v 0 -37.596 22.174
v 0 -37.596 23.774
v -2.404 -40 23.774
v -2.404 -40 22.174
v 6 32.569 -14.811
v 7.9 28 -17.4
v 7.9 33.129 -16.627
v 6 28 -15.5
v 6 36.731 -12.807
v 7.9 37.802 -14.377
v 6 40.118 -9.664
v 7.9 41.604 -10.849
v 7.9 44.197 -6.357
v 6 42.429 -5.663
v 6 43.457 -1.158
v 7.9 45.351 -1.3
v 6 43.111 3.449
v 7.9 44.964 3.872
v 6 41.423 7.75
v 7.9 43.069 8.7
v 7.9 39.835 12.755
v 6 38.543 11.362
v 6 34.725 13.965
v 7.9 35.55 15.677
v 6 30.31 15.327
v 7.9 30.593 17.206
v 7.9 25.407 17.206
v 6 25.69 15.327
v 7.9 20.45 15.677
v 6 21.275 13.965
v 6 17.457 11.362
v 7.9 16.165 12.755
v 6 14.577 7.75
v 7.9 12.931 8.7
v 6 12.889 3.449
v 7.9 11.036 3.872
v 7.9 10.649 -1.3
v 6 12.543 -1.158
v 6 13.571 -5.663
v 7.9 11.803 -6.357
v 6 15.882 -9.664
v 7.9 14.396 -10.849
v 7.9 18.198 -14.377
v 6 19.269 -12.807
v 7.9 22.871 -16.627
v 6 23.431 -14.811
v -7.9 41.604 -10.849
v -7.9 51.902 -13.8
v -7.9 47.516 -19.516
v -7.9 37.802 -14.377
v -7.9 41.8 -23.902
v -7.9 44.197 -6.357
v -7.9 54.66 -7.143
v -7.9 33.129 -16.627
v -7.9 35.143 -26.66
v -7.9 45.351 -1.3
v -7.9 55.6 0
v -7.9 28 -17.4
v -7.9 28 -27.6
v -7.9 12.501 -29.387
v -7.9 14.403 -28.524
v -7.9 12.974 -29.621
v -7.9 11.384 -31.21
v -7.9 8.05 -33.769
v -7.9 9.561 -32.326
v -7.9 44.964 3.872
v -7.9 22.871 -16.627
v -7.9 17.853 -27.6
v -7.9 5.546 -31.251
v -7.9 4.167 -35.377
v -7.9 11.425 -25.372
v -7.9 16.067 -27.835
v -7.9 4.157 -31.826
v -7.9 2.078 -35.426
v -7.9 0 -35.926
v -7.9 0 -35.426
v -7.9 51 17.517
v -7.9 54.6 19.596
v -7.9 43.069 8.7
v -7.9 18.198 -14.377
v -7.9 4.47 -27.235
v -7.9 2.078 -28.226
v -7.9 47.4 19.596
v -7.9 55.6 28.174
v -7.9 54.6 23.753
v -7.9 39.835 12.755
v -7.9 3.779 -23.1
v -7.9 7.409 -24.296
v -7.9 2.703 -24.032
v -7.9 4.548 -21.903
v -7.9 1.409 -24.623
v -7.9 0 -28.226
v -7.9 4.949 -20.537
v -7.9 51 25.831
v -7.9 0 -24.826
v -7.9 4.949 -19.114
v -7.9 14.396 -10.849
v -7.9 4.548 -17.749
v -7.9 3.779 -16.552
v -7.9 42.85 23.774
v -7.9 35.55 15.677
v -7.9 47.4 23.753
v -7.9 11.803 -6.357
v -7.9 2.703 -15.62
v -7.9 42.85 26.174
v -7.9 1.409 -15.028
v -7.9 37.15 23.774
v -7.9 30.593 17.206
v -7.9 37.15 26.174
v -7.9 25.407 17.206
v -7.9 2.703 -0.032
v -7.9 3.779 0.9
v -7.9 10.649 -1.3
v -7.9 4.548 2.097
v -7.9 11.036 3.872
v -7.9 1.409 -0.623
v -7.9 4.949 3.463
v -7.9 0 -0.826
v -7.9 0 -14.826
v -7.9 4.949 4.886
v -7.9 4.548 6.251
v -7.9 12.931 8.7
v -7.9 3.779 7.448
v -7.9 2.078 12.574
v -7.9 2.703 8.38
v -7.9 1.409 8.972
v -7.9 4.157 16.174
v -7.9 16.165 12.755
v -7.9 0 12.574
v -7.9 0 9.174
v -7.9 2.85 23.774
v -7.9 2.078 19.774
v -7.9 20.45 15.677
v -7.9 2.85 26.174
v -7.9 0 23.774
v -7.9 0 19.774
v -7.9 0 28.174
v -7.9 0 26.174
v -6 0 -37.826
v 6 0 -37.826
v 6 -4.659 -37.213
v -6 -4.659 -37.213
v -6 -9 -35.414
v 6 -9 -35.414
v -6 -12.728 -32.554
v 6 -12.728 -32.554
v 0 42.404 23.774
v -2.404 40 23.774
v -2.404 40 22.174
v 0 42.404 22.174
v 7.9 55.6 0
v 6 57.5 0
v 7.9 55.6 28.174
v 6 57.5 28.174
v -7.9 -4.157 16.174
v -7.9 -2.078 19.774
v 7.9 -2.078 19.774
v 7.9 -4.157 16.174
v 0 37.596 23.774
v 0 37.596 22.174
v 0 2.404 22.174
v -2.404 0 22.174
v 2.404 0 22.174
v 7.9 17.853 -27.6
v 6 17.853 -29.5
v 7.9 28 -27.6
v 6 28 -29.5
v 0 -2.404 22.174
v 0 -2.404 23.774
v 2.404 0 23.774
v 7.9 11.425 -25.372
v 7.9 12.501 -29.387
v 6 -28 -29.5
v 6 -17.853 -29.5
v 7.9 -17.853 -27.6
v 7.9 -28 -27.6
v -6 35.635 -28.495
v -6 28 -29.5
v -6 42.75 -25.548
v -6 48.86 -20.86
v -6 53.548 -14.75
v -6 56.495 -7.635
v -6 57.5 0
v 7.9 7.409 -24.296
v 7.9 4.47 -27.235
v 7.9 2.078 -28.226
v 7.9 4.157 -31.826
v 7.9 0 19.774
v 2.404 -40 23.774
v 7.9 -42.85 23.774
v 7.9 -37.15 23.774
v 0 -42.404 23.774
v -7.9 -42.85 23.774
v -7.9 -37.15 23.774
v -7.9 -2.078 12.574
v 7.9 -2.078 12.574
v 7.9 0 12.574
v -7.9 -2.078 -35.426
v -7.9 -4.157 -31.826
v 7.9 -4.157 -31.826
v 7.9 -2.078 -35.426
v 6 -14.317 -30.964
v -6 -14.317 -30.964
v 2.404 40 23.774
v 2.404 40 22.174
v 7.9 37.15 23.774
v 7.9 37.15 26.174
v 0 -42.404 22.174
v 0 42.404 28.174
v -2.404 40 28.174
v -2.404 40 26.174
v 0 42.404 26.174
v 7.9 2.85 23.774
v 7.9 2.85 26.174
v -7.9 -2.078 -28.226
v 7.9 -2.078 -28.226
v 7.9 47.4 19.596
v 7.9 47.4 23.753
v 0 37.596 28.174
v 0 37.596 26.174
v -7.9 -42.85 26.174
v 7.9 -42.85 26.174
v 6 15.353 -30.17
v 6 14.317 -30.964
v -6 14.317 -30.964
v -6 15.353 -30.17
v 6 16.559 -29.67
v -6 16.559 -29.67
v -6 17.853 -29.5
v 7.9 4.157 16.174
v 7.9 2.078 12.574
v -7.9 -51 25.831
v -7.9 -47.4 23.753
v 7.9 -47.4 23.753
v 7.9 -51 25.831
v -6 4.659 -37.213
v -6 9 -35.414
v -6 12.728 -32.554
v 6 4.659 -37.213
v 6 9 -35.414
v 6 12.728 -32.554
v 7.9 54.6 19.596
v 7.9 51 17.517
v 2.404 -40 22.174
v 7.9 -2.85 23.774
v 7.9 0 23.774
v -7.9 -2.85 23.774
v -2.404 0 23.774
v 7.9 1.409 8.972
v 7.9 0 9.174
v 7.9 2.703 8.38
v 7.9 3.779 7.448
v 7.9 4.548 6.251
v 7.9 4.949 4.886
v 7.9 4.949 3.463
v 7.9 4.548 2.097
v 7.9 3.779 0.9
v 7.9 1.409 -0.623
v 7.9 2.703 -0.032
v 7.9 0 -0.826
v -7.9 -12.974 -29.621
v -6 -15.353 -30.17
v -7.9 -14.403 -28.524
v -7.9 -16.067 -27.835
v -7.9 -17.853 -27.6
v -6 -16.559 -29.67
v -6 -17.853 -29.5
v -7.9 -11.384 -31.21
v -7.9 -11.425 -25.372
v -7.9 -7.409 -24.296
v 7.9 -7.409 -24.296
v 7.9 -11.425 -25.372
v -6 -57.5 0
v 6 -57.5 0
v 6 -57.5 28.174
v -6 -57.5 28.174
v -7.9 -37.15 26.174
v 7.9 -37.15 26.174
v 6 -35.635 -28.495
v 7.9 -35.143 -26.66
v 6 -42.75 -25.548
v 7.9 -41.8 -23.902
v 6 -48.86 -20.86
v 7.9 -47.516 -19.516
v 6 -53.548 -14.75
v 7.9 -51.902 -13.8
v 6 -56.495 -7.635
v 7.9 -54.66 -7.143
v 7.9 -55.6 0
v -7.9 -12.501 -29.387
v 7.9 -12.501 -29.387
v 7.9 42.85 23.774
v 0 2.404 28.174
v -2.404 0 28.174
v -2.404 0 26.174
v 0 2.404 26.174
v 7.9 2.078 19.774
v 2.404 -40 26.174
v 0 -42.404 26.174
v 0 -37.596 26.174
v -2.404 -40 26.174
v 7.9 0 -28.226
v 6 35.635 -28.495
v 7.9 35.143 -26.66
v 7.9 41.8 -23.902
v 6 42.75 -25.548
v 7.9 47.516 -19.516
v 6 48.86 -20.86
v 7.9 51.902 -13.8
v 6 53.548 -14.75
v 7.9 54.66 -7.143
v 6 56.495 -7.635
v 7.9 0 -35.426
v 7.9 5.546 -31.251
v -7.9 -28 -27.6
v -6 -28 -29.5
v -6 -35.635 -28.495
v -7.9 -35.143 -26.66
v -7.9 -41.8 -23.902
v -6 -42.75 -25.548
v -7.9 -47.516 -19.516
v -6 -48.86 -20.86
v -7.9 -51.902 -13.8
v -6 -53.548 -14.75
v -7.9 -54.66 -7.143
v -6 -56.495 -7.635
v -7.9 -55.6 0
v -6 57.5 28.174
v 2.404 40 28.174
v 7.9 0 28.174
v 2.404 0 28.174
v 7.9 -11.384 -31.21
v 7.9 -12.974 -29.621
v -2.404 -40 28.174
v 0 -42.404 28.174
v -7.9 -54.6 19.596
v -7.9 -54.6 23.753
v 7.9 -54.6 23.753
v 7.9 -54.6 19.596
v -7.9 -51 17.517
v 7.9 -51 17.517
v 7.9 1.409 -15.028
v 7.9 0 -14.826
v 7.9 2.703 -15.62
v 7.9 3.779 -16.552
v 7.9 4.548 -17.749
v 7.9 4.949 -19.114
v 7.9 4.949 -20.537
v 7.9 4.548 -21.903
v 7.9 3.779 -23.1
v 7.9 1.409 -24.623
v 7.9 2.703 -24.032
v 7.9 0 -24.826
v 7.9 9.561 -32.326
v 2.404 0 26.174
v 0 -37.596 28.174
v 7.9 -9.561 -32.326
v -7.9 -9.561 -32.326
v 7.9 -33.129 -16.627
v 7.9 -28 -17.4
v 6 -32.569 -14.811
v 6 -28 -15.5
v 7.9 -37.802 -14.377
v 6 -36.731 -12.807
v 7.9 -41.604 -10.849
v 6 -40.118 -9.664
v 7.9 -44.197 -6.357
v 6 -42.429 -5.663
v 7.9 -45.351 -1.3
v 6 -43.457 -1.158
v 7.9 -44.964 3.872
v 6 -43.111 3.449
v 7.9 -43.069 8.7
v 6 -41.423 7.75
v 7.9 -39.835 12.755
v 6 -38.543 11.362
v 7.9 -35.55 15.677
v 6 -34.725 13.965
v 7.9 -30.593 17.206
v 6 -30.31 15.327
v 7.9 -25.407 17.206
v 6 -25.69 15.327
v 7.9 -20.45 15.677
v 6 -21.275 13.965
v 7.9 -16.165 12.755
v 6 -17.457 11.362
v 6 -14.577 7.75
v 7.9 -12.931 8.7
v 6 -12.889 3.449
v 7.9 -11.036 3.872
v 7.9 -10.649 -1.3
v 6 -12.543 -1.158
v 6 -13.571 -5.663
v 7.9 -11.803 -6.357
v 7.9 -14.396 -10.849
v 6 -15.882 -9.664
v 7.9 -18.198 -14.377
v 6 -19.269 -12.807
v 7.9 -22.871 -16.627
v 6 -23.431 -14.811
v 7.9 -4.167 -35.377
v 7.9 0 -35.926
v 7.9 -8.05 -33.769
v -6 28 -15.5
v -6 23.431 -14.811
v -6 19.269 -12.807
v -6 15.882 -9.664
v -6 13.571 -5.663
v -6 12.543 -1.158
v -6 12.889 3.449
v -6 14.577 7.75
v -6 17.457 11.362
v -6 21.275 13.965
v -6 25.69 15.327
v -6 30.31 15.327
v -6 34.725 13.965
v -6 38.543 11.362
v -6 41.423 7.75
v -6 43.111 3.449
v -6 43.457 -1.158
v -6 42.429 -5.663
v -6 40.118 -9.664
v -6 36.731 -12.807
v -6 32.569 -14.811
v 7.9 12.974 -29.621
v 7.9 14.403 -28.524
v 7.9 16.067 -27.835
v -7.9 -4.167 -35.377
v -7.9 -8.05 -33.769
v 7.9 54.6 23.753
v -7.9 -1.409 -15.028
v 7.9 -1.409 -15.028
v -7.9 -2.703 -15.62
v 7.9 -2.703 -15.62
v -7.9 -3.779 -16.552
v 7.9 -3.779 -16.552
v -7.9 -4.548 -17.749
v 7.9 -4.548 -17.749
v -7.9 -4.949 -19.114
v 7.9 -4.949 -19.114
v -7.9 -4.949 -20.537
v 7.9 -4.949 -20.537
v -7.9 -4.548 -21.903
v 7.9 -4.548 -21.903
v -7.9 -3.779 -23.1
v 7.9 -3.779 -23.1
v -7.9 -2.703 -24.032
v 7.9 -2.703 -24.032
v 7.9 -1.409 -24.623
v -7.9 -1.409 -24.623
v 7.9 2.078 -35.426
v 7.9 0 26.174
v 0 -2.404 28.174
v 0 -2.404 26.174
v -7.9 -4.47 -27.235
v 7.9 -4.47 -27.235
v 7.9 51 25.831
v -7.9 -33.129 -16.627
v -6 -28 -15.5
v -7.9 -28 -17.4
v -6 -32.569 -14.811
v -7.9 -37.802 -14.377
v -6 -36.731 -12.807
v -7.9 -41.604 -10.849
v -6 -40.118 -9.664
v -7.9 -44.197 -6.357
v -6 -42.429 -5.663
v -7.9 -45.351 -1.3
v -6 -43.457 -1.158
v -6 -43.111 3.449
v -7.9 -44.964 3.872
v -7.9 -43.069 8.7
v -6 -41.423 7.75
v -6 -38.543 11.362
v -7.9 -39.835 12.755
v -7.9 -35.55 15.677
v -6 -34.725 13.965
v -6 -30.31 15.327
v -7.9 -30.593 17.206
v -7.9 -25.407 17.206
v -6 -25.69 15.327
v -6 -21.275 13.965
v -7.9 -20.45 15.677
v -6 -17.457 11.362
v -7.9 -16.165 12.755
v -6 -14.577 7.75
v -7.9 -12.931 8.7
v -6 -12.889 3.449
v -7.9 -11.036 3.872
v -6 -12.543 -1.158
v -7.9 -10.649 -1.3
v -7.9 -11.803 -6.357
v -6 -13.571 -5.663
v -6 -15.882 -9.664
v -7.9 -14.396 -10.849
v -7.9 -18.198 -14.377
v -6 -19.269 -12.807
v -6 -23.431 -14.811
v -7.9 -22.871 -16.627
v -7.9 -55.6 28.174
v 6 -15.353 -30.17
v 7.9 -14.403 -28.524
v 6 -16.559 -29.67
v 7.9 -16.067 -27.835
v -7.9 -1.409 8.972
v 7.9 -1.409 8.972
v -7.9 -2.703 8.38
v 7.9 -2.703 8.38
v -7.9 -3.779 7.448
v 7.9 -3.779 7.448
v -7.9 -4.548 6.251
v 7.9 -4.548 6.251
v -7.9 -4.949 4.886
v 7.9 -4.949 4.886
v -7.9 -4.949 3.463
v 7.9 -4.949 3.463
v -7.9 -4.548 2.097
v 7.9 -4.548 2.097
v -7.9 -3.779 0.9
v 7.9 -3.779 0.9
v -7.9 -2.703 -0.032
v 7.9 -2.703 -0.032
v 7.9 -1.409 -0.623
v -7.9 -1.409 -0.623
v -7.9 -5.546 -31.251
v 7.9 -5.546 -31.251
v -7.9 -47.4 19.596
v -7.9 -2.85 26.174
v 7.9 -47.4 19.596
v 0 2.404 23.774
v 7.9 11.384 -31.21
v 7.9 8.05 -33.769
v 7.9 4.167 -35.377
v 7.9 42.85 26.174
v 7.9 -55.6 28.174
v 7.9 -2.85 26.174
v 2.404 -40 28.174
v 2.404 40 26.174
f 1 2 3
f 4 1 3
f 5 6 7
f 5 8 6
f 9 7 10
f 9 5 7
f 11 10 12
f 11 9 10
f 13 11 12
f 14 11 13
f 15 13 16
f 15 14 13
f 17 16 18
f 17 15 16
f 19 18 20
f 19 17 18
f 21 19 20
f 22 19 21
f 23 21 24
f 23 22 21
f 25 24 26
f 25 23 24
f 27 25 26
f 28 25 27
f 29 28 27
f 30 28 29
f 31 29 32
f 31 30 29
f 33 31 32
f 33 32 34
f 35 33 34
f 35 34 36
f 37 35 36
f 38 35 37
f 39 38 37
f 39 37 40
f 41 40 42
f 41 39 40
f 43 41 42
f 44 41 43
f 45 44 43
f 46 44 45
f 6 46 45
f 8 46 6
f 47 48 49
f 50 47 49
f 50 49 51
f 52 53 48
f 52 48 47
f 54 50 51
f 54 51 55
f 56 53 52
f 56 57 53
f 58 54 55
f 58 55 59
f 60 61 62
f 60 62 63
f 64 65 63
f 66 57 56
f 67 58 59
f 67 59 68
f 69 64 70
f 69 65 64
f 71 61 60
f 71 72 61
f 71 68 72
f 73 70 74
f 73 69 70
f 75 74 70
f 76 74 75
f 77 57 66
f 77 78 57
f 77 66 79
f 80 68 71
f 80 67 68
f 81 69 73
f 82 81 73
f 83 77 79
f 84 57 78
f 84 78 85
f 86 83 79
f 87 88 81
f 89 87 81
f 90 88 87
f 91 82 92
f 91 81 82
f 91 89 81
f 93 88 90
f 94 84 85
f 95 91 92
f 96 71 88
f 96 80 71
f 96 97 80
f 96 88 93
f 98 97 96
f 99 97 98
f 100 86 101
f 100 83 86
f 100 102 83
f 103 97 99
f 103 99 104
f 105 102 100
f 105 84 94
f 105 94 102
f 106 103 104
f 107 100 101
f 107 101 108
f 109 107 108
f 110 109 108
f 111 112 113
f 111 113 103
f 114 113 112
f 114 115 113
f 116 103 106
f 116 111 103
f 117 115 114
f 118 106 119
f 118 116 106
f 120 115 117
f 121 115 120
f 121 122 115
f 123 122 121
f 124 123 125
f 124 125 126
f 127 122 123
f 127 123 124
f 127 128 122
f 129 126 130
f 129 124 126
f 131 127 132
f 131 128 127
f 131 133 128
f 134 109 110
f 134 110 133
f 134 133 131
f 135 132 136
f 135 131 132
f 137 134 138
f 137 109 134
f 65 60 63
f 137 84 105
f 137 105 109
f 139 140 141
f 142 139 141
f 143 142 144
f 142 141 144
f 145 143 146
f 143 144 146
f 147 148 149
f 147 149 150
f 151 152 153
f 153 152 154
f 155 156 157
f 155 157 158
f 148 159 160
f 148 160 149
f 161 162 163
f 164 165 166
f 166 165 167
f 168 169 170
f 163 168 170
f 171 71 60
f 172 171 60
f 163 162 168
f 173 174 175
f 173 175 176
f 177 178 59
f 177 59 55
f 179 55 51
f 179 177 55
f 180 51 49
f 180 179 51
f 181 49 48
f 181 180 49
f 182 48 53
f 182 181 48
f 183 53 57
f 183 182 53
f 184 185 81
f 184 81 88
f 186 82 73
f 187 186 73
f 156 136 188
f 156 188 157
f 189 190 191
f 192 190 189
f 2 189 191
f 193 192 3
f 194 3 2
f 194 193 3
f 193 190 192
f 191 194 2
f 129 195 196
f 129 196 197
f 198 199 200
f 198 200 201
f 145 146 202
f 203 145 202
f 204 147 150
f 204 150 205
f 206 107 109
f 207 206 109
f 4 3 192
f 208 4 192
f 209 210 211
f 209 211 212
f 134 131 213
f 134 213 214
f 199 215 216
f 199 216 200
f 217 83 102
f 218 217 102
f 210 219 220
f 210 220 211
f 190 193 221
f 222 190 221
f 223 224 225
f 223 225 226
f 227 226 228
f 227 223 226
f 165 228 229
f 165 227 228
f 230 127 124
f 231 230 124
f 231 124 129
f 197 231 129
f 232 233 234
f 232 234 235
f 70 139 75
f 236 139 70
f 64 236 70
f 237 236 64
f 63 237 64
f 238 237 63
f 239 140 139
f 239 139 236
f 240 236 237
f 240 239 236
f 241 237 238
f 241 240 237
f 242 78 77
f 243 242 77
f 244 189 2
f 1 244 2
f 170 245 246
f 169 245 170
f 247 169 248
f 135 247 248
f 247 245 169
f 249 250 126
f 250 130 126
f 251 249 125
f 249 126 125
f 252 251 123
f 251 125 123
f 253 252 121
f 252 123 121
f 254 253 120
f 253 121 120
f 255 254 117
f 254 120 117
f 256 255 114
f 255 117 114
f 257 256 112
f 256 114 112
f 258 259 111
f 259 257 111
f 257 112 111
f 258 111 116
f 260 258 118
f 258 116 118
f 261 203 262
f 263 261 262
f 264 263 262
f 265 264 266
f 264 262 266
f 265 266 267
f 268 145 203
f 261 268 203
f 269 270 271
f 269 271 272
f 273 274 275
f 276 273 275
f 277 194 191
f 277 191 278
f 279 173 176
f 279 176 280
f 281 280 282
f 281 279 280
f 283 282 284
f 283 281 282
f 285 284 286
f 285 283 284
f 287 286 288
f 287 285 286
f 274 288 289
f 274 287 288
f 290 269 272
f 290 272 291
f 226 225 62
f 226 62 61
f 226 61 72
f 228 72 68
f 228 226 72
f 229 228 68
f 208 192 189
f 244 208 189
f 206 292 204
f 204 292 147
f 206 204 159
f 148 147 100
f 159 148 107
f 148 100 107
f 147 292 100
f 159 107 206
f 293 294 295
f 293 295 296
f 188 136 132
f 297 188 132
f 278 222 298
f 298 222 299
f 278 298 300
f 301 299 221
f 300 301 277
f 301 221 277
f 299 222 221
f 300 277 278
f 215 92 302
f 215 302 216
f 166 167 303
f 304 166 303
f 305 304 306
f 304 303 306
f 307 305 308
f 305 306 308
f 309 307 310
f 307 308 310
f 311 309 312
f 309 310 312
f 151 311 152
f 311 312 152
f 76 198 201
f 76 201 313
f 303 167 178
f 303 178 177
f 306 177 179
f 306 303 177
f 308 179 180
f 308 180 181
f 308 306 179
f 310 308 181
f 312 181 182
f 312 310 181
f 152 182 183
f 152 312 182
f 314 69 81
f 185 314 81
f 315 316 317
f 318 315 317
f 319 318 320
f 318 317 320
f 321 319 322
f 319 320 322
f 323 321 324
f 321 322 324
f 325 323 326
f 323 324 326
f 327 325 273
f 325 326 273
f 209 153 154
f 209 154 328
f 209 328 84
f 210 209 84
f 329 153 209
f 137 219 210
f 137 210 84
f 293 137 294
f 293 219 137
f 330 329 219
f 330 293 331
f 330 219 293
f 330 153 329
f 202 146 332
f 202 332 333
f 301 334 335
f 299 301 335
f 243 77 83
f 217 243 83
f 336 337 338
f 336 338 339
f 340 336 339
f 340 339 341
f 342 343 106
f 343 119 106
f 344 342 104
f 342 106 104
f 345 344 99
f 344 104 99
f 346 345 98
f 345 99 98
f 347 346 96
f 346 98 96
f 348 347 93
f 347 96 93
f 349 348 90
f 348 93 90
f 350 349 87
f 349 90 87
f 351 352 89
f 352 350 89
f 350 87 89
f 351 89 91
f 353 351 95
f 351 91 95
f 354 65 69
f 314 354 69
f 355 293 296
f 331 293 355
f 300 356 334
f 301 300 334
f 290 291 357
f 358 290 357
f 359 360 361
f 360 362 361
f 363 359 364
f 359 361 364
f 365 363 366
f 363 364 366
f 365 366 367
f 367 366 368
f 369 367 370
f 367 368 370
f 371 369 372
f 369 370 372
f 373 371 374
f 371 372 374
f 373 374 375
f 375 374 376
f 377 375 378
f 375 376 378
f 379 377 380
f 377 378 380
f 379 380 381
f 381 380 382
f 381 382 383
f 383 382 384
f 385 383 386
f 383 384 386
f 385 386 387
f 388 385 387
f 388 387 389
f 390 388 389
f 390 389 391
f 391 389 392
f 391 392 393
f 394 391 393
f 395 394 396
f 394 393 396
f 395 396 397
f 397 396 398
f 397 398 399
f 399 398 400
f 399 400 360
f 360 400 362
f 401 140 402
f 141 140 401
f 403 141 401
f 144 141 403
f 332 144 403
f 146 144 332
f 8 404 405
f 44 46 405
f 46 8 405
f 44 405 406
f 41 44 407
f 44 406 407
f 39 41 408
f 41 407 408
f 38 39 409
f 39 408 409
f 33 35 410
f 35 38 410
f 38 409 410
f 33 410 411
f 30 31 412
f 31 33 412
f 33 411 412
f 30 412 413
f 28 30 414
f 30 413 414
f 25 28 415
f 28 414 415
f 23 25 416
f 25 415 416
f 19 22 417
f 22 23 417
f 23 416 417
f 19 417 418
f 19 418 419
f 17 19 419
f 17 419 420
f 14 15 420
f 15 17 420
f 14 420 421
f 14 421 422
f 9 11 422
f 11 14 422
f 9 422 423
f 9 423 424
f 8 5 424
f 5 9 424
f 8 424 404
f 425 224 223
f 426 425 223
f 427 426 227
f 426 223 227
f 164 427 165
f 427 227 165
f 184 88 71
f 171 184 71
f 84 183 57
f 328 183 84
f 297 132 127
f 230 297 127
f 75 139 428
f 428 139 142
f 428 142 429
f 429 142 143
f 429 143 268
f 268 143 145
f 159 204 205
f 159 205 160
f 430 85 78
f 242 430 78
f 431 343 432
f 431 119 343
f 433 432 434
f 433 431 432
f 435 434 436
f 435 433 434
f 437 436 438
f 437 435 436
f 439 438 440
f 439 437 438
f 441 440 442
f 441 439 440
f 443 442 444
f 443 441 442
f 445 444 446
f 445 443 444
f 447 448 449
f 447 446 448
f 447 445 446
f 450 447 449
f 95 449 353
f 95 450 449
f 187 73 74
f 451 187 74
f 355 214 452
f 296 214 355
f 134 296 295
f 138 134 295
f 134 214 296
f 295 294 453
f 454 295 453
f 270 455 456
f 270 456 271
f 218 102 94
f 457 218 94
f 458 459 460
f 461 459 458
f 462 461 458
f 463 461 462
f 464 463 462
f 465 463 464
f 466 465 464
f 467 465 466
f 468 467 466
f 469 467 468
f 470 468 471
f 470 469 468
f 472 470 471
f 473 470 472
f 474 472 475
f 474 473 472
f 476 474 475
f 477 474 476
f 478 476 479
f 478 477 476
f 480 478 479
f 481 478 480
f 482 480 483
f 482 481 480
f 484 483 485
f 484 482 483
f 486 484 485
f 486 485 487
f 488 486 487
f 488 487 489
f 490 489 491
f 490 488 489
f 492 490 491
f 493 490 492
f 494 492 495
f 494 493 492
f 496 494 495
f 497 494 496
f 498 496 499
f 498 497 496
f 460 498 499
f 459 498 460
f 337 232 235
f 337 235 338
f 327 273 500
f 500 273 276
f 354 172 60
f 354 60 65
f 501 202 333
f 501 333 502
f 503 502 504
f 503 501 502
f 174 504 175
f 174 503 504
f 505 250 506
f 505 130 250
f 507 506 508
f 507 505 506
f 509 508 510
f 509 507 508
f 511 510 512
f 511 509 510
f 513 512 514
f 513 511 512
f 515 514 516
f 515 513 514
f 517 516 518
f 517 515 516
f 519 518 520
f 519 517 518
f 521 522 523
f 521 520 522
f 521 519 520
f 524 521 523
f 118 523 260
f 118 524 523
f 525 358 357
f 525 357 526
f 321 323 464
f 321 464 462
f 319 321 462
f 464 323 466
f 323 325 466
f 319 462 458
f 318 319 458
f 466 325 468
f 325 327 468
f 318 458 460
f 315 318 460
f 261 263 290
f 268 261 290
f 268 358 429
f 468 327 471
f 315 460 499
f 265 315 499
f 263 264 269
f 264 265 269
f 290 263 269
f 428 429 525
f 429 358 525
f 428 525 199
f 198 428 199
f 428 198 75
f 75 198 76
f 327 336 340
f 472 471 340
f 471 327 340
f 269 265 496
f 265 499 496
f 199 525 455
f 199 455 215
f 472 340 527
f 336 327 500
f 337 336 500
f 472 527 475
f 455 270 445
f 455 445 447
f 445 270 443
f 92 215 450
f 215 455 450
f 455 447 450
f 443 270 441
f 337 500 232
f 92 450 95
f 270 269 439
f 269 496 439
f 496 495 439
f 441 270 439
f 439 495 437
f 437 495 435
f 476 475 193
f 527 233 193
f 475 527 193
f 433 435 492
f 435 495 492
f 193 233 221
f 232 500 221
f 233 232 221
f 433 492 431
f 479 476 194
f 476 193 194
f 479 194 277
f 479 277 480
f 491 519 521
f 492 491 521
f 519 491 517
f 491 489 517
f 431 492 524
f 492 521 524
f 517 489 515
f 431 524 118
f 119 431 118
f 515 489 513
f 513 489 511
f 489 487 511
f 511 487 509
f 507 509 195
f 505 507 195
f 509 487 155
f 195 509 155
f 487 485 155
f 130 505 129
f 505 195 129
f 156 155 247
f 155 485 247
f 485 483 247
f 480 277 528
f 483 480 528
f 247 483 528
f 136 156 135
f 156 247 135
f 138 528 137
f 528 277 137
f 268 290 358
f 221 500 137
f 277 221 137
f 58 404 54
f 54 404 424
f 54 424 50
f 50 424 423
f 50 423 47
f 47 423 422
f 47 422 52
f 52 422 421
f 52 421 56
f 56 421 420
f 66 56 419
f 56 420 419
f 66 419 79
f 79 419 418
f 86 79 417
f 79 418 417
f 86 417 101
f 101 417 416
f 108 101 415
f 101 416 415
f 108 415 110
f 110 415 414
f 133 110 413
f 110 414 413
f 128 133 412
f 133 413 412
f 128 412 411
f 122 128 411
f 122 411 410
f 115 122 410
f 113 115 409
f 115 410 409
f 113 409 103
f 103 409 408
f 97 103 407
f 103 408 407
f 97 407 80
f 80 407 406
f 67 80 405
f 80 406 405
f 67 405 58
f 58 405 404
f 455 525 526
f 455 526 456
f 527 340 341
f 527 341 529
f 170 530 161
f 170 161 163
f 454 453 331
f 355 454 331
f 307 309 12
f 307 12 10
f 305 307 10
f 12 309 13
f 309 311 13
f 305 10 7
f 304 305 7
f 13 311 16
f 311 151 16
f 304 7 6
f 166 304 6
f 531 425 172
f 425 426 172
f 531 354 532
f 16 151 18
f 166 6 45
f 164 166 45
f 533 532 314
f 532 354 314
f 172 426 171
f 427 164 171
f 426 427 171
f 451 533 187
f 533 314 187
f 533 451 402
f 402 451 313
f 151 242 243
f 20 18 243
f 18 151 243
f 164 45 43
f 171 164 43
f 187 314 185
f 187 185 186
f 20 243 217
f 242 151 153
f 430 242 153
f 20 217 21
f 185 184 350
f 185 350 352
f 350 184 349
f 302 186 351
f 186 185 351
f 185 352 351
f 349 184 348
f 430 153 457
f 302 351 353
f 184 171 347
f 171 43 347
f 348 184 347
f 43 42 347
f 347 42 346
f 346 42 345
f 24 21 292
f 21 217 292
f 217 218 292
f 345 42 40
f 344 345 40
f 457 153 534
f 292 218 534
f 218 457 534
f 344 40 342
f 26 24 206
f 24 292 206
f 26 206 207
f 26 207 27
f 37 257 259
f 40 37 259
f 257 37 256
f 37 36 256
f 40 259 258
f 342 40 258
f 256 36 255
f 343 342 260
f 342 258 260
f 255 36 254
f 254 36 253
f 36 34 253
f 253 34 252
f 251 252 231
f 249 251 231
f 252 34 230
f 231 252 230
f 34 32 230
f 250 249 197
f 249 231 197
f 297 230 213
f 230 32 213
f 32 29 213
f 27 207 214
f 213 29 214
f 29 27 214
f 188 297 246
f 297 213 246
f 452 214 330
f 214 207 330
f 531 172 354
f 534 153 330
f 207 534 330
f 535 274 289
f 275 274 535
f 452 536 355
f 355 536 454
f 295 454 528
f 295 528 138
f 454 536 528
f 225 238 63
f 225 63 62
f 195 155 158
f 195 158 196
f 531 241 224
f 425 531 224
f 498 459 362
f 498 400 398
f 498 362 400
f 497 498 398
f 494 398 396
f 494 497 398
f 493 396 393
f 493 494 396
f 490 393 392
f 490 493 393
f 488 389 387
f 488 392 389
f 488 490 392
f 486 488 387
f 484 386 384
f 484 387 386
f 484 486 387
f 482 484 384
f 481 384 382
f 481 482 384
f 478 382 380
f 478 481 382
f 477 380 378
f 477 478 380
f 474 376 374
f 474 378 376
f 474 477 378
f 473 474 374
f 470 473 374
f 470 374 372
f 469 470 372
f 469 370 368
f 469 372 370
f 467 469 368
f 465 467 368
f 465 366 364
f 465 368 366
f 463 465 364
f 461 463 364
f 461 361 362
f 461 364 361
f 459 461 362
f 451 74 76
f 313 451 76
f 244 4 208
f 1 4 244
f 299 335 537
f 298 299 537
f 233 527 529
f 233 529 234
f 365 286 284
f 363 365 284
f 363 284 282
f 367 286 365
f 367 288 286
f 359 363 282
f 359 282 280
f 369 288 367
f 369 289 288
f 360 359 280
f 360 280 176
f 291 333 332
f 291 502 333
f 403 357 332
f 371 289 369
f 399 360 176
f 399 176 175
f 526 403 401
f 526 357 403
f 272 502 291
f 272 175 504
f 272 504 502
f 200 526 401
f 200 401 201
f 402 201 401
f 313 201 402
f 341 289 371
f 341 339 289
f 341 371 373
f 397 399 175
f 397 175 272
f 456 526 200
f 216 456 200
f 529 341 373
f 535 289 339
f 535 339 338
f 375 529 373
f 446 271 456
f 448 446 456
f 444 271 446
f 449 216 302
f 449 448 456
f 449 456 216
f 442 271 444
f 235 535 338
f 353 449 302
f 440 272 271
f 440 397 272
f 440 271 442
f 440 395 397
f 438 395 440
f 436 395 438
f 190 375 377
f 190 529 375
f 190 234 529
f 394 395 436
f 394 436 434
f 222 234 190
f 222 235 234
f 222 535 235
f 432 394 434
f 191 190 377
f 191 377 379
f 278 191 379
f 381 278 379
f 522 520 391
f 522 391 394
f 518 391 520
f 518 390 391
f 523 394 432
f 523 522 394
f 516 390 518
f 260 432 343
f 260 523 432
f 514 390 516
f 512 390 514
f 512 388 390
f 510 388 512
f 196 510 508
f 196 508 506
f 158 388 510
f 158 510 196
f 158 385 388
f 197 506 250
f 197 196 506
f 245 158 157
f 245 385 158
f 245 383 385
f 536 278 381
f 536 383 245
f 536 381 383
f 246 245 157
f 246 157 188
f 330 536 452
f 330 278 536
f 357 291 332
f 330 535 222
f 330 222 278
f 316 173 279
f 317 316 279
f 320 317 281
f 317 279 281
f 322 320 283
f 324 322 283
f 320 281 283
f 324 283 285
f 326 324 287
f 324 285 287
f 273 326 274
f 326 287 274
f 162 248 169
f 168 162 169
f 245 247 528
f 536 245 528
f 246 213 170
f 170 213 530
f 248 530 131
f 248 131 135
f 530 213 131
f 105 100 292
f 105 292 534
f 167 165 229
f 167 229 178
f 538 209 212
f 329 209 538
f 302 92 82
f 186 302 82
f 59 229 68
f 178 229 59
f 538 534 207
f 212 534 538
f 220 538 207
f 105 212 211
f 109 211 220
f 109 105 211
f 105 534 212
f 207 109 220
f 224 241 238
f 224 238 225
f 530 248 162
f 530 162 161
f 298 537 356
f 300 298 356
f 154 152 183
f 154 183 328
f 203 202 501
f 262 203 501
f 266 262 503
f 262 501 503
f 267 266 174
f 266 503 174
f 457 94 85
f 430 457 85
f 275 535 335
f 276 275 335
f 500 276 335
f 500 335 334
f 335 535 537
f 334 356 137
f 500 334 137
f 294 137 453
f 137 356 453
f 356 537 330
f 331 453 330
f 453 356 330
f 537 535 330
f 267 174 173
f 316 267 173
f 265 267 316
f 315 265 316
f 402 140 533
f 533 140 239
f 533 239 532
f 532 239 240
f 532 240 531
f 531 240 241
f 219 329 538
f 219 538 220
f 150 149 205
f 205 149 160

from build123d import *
from build123d.topology import SkipClean

# Parameters (mm, degrees)
BOSS_EXTRUDE1_DEPTH     = 8
CUT_EXTRUDE1_DEPTH      = 78.289612463
CUT_EXTRUDE1_DEPTH_BACK = 70.289612463
CUT_EXTRUDE1_START      = -8
SKETCH9_R               = 5
CUT_EXTRUDE2_DEPTH      = 70.289612463
CUT_EXTRUDE2_DEPTH_BACK = 70.289612463
CUT_EXTRUDE3_DEPTH      = 70.289612463
CUT_EXTRUDE3_DEPTH_BACK = 70.289612463
SKETCH11_R              = 15.5
CUT_EXTRUDE4_DEPTH      = 70.289612463
CUT_EXTRUDE4_DEPTH_BACK = 70.289612463
SKETCH12_W              = 5.7
SKETCH12_H              = 2.4
CUT_EXTRUDE5_START      = 28.174078
CUT_EXTRUDE5_DEPTH      = 6
CHAMFER1_SIZE           = 2
MOVE_START              = -8
MOVE_FACE1_OUTLINE_W    = 59
MOVE_FACE1_OUTLINE_H    = 67
MOVE_FACE1_DEPTH        = 0.1
MOVE_START_2            = 7.9
MOVE_FACE1_2_OUTLINE_W  = 59
MOVE_FACE1_2_OUTLINE_H  = 67
MOVE_FACE1_2_DEPTH      = 0.1


# Read off the part's stored shape, not the designer's step: Move Face1
with BuildPart() as part:
    # Sketch2 → Boss-Extrude1 (new, symmetric)
    with BuildSketch(Plane.YZ):
        with BuildLine():
            Line((-12.727922061, -32.553844327), (-14.317300295, -30.964466094))
            ThreePointArc((-14.317300295, -30.964466094), (-15.939417039, -29.880602337), (-17.852834201, -29.5))
            Line((-17.852834201, -29.5), (-28, -29.5))
            ThreePointArc((-28, -29.5), (-48.859650045, -20.859650045), (-57.5, 0))
            Line((-57.5, 0), (-57.5, 28.174077734))
            Line((-57.5, 28.174077734), (0, 28.174077734))
            Line((0, 28.174077734), (0, -37.825922266))
            ThreePointArc((0, -37.825922266), (-6.888301783, -36.455753851), (-12.727922061, -32.553844327))
        make_face()
    extrude(amount=BOSS_EXTRUDE1_DEPTH, both=True)

    # Sketch9 → Cut-Extrude1 (cut, two sides: drawn at the far end of the back side and taken through both)
    with BuildSketch(Plane.YZ.offset(CUT_EXTRUDE1_START - CUT_EXTRUDE1_DEPTH_BACK)):
        with Locations((0, 4.174077734)):
            Circle(SKETCH9_R)
        with Locations((0, -19.825922266)):
            Circle(SKETCH9_R)
    extrude(amount=CUT_EXTRUDE1_DEPTH + CUT_EXTRUDE1_DEPTH_BACK, mode=Mode.SUBTRACT)

    # Sketch10 → Cut-Extrude2 (cut, two sides: drawn at the far end of the back side and taken through both)
    with BuildSketch(Plane.YZ.offset(-CUT_EXTRUDE2_DEPTH_BACK)):
        Polygon((2.078460969, 12.574077734), (4.156921938, 16.174077734), (2.078460969, 19.774077734), (-2.078460969, 19.774077734), (-4.156921938, 16.174077734), (-2.078460969, 12.574077734), align=None)
        Polygon((-5.545893683, -31.250591332), (-4.470003116, -27.235313074), (-7.409390808, -24.295925382), (-11.424669066, -25.371815949), (-12.500559632, -29.387094207), (-9.561171941, -32.326481898), align=None)
        Polygon((4.156921938, -31.825922266), (2.078460969, -28.225922266), (-2.078460969, -28.225922266), (-4.156921938, -31.825922266), (-2.078460969, -35.425922266), (2.078460969, -35.425922266), align=None)
        Polygon((12.500559632, -29.387094207), (11.424669066, -25.371815949), (7.409390808, -24.295925382), (4.470003116, -27.235313074), (5.545893683, -31.250591332), (9.561171941, -32.326481898), align=None)
        Polygon((-51, 17.517155796), (-47.4, 19.595616765), (-47.4, 23.752538703), (-51, 25.830999672), (-54.6, 23.752538703), (-54.6, 19.595616765), align=None)
    extrude(amount=CUT_EXTRUDE2_DEPTH + CUT_EXTRUDE2_DEPTH_BACK, mode=Mode.SUBTRACT)

    # Sketch11 → Cut-Extrude3 (cut, two sides: drawn at the far end of the back side and taken through both)
    with BuildSketch(Plane.YZ.offset(-CUT_EXTRUDE3_DEPTH_BACK)):
        with Locations(Location((-28, 0, 0), (0, 0, 270))):
            Circle(SKETCH11_R)
    extrude(amount=CUT_EXTRUDE3_DEPTH + CUT_EXTRUDE3_DEPTH_BACK, mode=Mode.SUBTRACT)

    # Sketch12 → Cut-Extrude4 (cut, two sides: drawn at the far end of the back side and taken through both)
    with BuildSketch(Plane.YZ.offset(-CUT_EXTRUDE4_DEPTH_BACK)):
        with Locations((-40, 24.974077734)):
            Rectangle(SKETCH12_W, SKETCH12_H)
        with Locations((0, 24.974077734)):
            Rectangle(SKETCH12_W, SKETCH12_H)
    extrude(amount=CUT_EXTRUDE4_DEPTH + CUT_EXTRUDE4_DEPTH_BACK, mode=Mode.SUBTRACT)

    # Sketch13 → Cut-Extrude5 (cut)
    with BuildSketch(Plane.XY.offset(CUT_EXTRUDE5_START)):
        Polygon((0, -2.404163056), (2.404163056, 0), (0, 2.404163056), (-2.404163056, 0), align=None)
        Polygon((0, -42.404163056), (2.404163056, -40), (0, -37.595836944), (-2.404163056, -40), align=None)
    extrude(amount=-CUT_EXTRUDE5_DEPTH, mode=Mode.SUBTRACT)

    # Chamfer1
    chamfer1_edges = [part.edges().sort_by_distance(p)[0] for p in [
        (8, -22.9264171, -29.5),
        (8, -48.859650045, -20.859650045),
        (8, -57.5, 14.087038867),
        (-8, -48.859650045, -20.859650045),
        (-8, -28, 15.5),
        (8, -28, 15.5),
        (-8, -22.9264171, -29.5),
        (-8, -15.939417039, -29.880602337),
        (-8, -13.522611178, -31.759155211),
        (-8, -6.888301783, -36.455753851),
        (-8, -57.5, 14.087038867),
        (8, -6.888301783, -36.455753851),
        (8, -13.522611178, -31.759155211),
        (8, -15.939417039, -29.880602337),
    ]]
    chamfer(chamfer1_edges, length=CHAMFER1_SIZE)

    # Move Face1 outline → Move Face1 (cut)
    with BuildSketch(Plane.YZ.offset(MOVE_START)):
        with Locations((-27.5, -3.5)):
            Rectangle(MOVE_FACE1_OUTLINE_W, MOVE_FACE1_OUTLINE_H)
    extrude(amount=MOVE_FACE1_DEPTH, mode=Mode.SUBTRACT)

    # Move Face1 2 outline → Move Face1 2 (cut)
    with BuildSketch(Plane.YZ.offset(MOVE_START_2)):
        with Locations((-27.5, -3.5)):
            Rectangle(MOVE_FACE1_2_OUTLINE_W, MOVE_FACE1_2_OUTLINE_H)
    extrude(amount=MOVE_FACE1_2_DEPTH, mode=Mode.SUBTRACT)

    # Mirror1: part across plane


with BuildPart() as part_1:
    with SkipClean():  # the faces are left unmerged after this step: merging them gives an invalid solid
        add(part.part)
        add(part.part.mirror(Plane(origin=(0, 0, 0), x_dir=(0, 0, 1), z_dir=(0, -1, 0))))


solid = part_1.part
